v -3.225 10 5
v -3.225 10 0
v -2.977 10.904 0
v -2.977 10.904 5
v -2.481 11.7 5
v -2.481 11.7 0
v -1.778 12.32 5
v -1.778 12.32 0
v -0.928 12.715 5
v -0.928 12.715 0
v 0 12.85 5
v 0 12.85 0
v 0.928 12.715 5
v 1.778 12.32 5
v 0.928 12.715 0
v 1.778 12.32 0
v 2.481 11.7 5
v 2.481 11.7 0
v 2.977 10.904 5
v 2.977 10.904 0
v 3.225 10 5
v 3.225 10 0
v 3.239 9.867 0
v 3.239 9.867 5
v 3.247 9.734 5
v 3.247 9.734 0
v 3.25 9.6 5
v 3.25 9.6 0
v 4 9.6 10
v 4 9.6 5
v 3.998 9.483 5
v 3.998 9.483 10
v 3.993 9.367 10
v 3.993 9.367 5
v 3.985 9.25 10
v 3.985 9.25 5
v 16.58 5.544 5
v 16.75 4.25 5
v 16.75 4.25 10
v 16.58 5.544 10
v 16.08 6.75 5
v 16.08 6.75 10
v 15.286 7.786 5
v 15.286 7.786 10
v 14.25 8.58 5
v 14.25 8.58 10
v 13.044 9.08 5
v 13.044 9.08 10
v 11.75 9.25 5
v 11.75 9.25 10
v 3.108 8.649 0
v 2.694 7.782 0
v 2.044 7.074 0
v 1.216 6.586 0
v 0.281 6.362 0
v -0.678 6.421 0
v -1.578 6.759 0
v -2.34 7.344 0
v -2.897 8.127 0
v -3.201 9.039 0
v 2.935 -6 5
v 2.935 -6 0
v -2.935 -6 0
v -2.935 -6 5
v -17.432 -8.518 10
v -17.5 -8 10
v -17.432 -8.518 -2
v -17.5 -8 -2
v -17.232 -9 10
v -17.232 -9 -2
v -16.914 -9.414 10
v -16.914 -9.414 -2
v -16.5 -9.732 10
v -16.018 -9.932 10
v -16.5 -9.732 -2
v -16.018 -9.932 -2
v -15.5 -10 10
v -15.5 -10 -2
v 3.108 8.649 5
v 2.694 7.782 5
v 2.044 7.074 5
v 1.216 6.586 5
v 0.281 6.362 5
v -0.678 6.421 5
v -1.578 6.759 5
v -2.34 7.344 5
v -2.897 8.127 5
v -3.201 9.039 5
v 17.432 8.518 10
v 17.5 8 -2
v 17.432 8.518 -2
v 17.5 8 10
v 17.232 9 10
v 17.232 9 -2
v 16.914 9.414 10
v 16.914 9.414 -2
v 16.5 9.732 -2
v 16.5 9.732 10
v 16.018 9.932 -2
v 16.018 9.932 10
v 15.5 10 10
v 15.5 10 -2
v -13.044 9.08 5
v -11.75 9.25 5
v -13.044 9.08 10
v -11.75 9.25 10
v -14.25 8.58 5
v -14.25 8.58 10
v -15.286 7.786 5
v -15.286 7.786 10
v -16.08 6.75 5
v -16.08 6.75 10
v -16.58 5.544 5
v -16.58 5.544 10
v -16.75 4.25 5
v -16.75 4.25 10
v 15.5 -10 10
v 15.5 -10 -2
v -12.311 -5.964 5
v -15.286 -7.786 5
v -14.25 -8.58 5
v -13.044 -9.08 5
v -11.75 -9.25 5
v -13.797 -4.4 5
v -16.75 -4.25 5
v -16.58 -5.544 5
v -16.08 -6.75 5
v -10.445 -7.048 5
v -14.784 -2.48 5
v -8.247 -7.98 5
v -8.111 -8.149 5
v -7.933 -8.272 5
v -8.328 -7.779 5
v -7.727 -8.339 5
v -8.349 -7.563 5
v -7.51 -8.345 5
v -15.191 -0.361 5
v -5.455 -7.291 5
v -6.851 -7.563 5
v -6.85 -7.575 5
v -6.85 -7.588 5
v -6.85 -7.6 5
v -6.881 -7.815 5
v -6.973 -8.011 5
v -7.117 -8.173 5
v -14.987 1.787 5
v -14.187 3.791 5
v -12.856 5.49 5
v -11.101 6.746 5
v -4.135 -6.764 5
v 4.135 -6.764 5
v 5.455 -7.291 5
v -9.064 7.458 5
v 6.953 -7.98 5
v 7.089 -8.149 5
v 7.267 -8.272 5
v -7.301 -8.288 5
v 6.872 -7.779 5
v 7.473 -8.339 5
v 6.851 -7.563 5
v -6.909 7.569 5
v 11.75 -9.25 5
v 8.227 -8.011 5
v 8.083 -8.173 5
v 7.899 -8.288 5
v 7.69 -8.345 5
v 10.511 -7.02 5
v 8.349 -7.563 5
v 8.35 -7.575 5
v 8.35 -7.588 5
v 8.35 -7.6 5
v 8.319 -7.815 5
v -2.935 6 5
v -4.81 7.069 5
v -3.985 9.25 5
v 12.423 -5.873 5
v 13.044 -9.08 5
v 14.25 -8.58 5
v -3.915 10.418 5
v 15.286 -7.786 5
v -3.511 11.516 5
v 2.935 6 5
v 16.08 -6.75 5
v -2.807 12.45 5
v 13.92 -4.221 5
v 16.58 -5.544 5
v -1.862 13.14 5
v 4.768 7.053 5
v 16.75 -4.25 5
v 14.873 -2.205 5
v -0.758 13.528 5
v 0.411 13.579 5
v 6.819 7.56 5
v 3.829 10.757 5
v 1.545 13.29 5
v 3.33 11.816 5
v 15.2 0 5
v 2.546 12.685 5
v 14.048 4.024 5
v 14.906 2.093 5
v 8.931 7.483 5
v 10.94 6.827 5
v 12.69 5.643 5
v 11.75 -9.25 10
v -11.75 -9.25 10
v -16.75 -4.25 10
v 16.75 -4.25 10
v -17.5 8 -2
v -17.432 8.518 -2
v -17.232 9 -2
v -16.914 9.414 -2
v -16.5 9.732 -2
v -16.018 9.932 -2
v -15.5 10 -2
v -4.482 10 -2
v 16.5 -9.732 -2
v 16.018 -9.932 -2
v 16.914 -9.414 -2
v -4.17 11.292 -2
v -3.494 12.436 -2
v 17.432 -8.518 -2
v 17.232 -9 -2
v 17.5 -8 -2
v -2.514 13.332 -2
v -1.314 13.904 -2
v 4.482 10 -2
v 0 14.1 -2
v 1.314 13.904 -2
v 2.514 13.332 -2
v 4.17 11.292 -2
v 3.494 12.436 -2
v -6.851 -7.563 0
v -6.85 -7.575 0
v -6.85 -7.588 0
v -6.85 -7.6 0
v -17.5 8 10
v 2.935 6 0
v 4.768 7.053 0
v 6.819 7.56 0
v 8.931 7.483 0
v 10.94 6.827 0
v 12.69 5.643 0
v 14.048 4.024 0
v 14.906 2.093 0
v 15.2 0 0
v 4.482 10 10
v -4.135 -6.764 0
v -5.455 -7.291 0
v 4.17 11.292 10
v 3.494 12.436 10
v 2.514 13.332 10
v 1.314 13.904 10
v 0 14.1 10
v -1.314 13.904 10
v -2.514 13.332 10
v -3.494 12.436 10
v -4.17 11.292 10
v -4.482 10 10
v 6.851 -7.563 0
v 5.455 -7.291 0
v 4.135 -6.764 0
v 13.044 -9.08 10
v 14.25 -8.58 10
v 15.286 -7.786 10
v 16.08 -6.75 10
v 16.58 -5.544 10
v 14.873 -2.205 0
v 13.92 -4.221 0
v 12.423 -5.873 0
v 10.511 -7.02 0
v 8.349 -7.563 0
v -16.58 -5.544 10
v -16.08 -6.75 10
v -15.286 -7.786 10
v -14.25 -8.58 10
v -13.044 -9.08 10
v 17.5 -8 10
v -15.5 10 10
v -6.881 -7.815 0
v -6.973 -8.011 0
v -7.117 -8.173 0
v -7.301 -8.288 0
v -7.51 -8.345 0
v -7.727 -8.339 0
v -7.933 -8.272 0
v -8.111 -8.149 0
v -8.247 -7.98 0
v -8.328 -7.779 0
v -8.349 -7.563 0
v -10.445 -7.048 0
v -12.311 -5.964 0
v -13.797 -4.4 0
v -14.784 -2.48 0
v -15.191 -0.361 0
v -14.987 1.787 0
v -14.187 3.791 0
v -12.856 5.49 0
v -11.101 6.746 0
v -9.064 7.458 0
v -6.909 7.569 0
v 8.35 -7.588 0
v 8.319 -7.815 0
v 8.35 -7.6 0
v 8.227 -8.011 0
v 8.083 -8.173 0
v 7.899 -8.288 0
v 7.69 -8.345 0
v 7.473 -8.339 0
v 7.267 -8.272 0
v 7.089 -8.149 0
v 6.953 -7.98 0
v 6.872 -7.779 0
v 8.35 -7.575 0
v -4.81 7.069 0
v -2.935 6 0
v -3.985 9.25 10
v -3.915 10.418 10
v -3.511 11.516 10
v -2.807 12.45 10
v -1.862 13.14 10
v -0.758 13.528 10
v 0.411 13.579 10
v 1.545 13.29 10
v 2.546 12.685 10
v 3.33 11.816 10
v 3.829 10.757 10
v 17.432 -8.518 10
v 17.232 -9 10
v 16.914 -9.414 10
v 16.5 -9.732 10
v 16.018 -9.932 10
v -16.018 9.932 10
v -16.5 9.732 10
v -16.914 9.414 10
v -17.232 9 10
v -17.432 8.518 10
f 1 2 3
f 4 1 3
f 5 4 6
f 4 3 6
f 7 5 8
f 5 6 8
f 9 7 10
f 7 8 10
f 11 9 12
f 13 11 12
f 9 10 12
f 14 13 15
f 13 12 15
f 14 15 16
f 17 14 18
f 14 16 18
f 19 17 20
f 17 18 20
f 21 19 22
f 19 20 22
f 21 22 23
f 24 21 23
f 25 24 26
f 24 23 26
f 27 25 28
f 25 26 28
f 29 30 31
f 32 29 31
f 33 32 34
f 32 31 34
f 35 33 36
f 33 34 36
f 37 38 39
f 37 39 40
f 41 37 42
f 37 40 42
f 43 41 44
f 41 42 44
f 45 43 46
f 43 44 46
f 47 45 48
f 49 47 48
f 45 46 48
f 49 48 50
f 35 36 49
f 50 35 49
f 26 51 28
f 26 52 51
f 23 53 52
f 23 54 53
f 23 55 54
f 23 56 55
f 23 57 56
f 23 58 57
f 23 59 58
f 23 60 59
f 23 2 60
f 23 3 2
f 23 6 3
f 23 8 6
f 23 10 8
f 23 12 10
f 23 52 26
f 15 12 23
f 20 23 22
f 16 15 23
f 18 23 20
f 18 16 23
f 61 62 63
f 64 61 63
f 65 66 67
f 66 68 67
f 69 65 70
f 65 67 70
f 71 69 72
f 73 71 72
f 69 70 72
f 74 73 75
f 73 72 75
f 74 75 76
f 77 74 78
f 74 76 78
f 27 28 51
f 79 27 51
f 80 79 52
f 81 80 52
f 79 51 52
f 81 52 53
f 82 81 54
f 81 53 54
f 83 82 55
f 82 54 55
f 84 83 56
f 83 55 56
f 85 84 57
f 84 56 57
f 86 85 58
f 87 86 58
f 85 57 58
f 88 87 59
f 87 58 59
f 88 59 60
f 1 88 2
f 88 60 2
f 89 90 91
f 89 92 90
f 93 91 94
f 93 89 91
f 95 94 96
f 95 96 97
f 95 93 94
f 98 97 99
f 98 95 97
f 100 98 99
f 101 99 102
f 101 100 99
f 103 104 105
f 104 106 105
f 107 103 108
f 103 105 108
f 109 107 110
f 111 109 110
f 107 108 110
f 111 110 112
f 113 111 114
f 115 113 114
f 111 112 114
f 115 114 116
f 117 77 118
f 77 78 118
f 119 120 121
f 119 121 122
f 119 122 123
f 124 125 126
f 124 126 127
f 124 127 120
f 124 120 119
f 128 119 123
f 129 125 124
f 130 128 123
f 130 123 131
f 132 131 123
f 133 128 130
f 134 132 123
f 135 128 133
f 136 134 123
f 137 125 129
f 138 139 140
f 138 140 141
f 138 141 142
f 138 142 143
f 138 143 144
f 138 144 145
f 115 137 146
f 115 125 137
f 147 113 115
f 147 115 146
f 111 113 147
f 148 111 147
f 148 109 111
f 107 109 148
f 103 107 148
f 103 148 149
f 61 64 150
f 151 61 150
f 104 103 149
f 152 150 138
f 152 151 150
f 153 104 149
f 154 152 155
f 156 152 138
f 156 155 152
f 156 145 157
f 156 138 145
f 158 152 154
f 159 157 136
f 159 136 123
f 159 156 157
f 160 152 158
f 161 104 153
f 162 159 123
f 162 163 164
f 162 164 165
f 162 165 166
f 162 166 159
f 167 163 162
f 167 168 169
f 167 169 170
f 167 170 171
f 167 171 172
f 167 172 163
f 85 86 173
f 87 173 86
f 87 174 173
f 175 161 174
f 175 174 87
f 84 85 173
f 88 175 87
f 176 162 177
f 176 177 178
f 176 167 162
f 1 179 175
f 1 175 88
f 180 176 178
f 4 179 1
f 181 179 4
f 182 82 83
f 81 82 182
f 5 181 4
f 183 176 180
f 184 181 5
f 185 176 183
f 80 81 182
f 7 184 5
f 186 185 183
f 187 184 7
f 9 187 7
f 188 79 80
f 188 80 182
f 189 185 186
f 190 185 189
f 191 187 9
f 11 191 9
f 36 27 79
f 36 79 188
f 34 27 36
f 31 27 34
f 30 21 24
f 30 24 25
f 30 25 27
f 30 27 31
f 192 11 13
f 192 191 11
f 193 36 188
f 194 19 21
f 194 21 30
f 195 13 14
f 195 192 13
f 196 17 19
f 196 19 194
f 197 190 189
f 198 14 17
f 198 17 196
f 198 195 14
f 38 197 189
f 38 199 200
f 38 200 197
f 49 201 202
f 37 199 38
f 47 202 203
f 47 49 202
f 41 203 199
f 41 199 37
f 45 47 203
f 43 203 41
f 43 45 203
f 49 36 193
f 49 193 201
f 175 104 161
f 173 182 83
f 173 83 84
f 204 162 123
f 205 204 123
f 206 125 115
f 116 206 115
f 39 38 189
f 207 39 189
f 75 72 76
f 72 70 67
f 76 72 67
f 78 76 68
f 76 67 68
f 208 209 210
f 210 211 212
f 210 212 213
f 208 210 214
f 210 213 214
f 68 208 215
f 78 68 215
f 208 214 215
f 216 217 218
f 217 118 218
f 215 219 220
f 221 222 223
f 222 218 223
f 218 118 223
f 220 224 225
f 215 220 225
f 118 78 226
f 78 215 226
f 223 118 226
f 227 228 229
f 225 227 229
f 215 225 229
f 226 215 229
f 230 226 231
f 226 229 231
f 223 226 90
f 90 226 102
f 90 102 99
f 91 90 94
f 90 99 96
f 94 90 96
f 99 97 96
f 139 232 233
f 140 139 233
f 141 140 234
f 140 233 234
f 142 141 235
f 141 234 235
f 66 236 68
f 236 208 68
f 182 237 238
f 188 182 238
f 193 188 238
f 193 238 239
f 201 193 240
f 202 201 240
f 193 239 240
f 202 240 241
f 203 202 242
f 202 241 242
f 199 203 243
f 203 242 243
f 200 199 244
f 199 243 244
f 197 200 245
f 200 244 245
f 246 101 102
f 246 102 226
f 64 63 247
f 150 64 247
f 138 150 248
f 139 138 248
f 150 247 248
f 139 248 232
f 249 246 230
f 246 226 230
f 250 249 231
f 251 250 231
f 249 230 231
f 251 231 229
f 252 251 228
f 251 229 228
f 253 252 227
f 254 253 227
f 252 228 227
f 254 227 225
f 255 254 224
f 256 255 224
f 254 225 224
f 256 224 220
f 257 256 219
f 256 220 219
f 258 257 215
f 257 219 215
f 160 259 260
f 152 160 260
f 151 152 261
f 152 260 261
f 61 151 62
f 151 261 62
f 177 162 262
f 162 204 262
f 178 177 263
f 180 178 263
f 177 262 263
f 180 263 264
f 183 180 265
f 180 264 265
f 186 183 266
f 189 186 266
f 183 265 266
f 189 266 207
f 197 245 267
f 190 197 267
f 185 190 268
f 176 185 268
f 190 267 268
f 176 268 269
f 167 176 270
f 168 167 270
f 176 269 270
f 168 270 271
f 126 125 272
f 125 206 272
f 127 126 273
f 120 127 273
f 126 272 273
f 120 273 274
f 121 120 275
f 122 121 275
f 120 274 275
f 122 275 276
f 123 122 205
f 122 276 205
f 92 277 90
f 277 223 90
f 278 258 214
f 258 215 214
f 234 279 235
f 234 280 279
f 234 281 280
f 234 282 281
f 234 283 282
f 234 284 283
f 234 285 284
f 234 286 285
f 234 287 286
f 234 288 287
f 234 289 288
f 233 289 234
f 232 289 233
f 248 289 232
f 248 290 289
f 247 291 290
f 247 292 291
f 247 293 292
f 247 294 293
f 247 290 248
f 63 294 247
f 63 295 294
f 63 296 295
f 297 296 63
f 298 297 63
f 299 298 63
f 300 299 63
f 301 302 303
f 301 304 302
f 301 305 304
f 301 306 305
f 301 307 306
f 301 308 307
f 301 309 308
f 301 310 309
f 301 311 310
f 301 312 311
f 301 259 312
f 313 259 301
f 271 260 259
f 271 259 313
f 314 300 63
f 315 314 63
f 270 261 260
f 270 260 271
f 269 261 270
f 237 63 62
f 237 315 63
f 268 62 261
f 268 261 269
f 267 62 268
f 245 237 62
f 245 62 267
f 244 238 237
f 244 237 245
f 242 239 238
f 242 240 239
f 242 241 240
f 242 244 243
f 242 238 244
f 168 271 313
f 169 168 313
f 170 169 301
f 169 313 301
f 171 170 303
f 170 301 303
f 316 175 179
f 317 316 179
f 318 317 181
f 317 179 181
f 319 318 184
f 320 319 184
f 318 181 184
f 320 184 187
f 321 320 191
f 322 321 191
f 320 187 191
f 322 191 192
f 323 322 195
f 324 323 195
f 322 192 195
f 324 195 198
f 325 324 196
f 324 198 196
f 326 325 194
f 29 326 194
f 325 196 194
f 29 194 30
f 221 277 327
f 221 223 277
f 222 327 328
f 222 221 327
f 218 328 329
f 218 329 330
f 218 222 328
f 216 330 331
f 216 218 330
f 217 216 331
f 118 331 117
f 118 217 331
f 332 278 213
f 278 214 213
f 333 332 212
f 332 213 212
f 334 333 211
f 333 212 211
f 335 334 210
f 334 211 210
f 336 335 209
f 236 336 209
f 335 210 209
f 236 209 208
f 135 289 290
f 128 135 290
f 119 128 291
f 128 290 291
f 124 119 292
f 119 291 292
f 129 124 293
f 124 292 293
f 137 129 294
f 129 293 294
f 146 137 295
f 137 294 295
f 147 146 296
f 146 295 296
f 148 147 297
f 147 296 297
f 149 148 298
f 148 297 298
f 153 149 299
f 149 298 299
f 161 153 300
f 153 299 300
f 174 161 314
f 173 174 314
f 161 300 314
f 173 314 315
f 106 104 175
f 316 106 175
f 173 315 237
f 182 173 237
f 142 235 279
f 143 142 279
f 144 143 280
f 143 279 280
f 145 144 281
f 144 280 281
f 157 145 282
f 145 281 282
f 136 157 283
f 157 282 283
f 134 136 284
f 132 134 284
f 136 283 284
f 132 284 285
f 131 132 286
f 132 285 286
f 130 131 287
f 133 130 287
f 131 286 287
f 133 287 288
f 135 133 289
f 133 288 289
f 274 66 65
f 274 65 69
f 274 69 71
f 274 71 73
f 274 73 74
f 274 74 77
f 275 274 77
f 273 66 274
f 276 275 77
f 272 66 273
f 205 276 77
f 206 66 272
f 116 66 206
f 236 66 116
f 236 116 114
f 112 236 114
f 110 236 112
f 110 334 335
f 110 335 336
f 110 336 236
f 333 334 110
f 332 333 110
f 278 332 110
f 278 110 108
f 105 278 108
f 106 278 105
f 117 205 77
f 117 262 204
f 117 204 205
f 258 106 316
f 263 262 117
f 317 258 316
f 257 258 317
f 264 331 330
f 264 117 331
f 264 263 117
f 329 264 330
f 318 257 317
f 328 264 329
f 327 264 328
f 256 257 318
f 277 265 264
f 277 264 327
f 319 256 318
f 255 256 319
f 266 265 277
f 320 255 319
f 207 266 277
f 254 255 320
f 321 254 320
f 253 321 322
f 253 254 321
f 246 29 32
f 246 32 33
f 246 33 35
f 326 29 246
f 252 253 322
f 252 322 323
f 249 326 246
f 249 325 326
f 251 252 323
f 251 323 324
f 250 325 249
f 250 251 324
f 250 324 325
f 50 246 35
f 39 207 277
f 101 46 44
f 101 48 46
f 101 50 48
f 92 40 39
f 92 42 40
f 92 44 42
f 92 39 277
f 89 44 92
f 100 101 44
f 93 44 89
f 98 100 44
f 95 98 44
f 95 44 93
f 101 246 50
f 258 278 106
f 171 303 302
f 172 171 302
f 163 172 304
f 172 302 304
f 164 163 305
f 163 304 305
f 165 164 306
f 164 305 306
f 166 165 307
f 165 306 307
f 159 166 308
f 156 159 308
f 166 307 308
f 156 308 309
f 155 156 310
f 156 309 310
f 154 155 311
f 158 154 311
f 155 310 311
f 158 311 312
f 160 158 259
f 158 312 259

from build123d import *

# Parameters (mm, degrees)
F1_DEPTH = 2
F2_DEPTH = 5
F4_DEPTH = 5
F5_R     = 2
F6_R     = 5


# Not quite as in the source:
# - a feature names something its author has since deleted; it is built from what else it names


with BuildPart() as f1:
    # F0 (on Top) → F1 (new body)
    with BuildSketch(Plane.XY):
        with BuildLine():
            ThreePointArc((4.4821870069, 10), (0, 14.100000456), (-4.4821870069, 10))
            Line((-4.4821870069, 10), (-3.2252907411, 10))
            ThreePointArc((-3.2252907411, 10), (0, 12.850000456), (3.2252907411, 10))
            Line((3.2252907411, 10), (4.4821870069, 10))
        make_face()
        with BuildLine():
            Line((3.2252907411, 10), (-3.2252907411, 10))
            ThreePointArc((-3.2252907411, 10), (-0.2003810013, 6.3561836525), (3.25, 9.600000456))
            ThreePointArc((3.25, 9.600000456), (3.2438168034, 9.8003814573), (3.2252907411, 10))
        make_face()
        with BuildLine():
            ThreePointArc((3.2252907411, 10), (0, 12.850000456), (-3.2252907411, 10))
            Line((-3.2252907411, 10), (3.2252907411, 10))
        make_face()
        with BuildLine():
            ThreePointArc((-2.9352384841, 6), (-0.7731344117, 3.3397464334), (0, 0))
            ThreePointArc((0, 0), (0.7731344117, 3.3397464334), (2.9352384841, 6))
            Line((2.9352384841, 6), (2.699999392, 6))
            ThreePointArc((2.699999392, 6), (0, 5.100000456), (-2.699999392, 6))
            Line((-2.699999392, 6), (-2.9352384841, 6))
        make_face()
        with BuildLine():
            ThreePointArc((2.9352384841, -6), (0.7731344117, -3.3397464334), (0, 0))
            ThreePointArc((0, 0), (-0.7731344117, -3.3397464334), (-2.9352384841, -6))
            Line((-2.9352384841, -6), (2.9352384841, -6))
        make_face()
        with BuildLine():
            ThreePointArc((-4.4821870069, 10), (-4.1104683878, 7.768593993), (-2.699999392, 6))
            Line((-2.699999392, 6), (2.699999392, 6))
            ThreePointArc((2.699999392, 6), (4.0249221896, 7.5875389364), (4.5, 9.600000456))
            ThreePointArc((4.5, 9.600000456), (4.495544546, 9.8001984442), (4.4821870069, 10))
            Line((4.4821870069, 10), (3.2252907411, 10))
            ThreePointArc((3.2252907411, 10), (3.2438168034, 9.8003814573), (3.25, 9.600000456))
            ThreePointArc((3.25, 9.600000456), (-0.2003810013, 6.3561836525), (-3.2252907411, 10))
            Line((-3.2252907411, 10), (-4.4821870069, 10))
        make_face()
        with BuildLine():
            ThreePointArc((-2.9352384841, -6), (-0.7731344117, -3.3397464334), (0, 0))
            ThreePointArc((0, 0), (-0.7731344117, 3.3397464334), (-2.9352384841, 6))
            ThreePointArc((-2.9352384841, 6), (-14.6584577236, 2.8174766307), (-8.3490864524, -7.5629934211))
            ThreePointArc((-8.3490864524, -7.5629934211), (-7.6, -6.85), (-6.8509135476, -7.5629934211))
            ThreePointArc((-6.8509135476, -7.5629934211), (-4.7825233693, -7.0584577236), (-2.9352384841, -6))
        make_face()
        with BuildLine():
            ThreePointArc((2.9352384841, 6), (0.7731344117, 3.3397464334), (0, 0))
            ThreePointArc((0, 0), (0.7731344117, -3.3397464334), (2.9352384841, -6))
            ThreePointArc((2.9352384841, -6), (4.7825233693, -7.0584577236), (6.8509135476, -7.5629934211))
            ThreePointArc((6.8509135476, -7.5629934211), (7.6, -6.85), (8.3490864524, -7.5629934211))
            ThreePointArc((8.3490864524, -7.5629934211), (13.2326306926, -5.1023006067), (15.2, 0))
            ThreePointArc((15.2, 0), (10.9397464334, 6.8268655883), (2.9352384841, 6))
        make_face()
        with BuildLine():
            ThreePointArc((-8.3490864524, -7.5629934211), (-14.6584577236, 2.8174766307), (-2.9352384841, 6))
            Line((-2.9352384841, 6), (-2.699999392, 6))
            ThreePointArc((-2.699999392, 6), (-4.1104683878, 7.768593993), (-4.4821870069, 10))
            Line((-4.4821870069, 10), (-17.5, 10))
            Line((-17.5, 10), (-17.5, -10))
            Line((-17.5, -10), (17.5, -10))
            Line((17.5, -10), (17.5, 10))
            Line((17.5, 10), (4.4821870069, 10))
            ThreePointArc((4.4821870069, 10), (4.495544546, 9.8001984442), (4.5, 9.600000456))
            ThreePointArc((4.5, 9.600000456), (4.0249221896, 7.5875389364), (2.699999392, 6))
            Line((2.699999392, 6), (2.9352384841, 6))
            ThreePointArc((2.9352384841, 6), (10.9397464334, 6.8268655883), (15.2, 0))
            ThreePointArc((15.2, 0), (13.2326306926, -5.1023006067), (8.3490864524, -7.5629934211))
            ThreePointArc((8.3490864524, -7.5629934211), (8.3497715783, -7.5814910734), (8.35, -7.6))
            ThreePointArc((8.35, -7.6), (7.5814910734, -8.3497715783), (6.8509135476, -7.5629934211))
            ThreePointArc((6.8509135476, -7.5629934211), (4.7825233693, -7.0584577236), (2.9352384841, -6))
            Line((2.9352384841, -6), (-2.9352384841, -6))
            ThreePointArc((-2.9352384841, -6), (-4.7825233693, -7.0584577236), (-6.8509135476, -7.5629934211))
            ThreePointArc((-6.8509135476, -7.5629934211), (-6.8502284217, -7.5814910734), (-6.85, -7.6))
            ThreePointArc((-6.85, -7.6), (-7.6185089266, -8.3497715783), (-8.3490864524, -7.5629934211))
        make_face()
        with BuildLine():
            ThreePointArc((-6.8509135476, -7.5629934211), (-7.6, -6.85), (-8.3490864524, -7.5629934211))
            ThreePointArc((-8.3490864524, -7.5629934211), (-7.6, -7.6), (-6.8509135476, -7.5629934211))
        make_face()
        with BuildLine():
            ThreePointArc((-6.8509135476, -7.5629934211), (-7.6, -7.6), (-8.3490864524, -7.5629934211))
            ThreePointArc((-8.3490864524, -7.5629934211), (-7.6185089266, -8.3497715783), (-6.85, -7.6))
            ThreePointArc((-6.85, -7.6), (-6.8502284217, -7.5814910734), (-6.8509135476, -7.5629934211))
        make_face()
        with BuildLine():
            ThreePointArc((8.3490864524, -7.5629934211), (7.6, -6.85), (6.8509135476, -7.5629934211))
            ThreePointArc((6.8509135476, -7.5629934211), (7.6, -7.6), (8.3490864524, -7.5629934211))
        make_face()
        with BuildLine():
            ThreePointArc((8.3490864524, -7.5629934211), (7.6, -7.6), (6.8509135476, -7.5629934211))
            ThreePointArc((6.8509135476, -7.5629934211), (7.5814910734, -8.3497715783), (8.35, -7.6))
            ThreePointArc((8.35, -7.6), (8.3497715783, -7.5814910734), (8.3490864524, -7.5629934211))
        make_face()
        with BuildLine():
            Line((2.699999392, 6), (-2.699999392, 6))
            ThreePointArc((-2.699999392, 6), (0, 5.100000456), (2.699999392, 6))
        make_face()
    extrude(amount=-F1_DEPTH)

    # F0 (on Top) → F2 (join)
    with BuildSketch(Plane.XY):
        with BuildLine():
            ThreePointArc((-8.3490864524, -7.5629934211), (-14.6584577236, 2.8174766307), (-2.9352384841, 6))
            Line((-2.9352384841, 6), (-2.699999392, 6))
            ThreePointArc((-2.699999392, 6), (-4.1104683878, 7.768593993), (-4.4821870069, 10))
            Line((-4.4821870069, 10), (-17.5, 10))
            Line((-17.5, 10), (-17.5, -10))
            Line((-17.5, -10), (17.5, -10))
            Line((17.5, -10), (17.5, 10))
            Line((17.5, 10), (4.4821870069, 10))
            ThreePointArc((4.4821870069, 10), (4.495544546, 9.8001984442), (4.5, 9.600000456))
            ThreePointArc((4.5, 9.600000456), (4.0249221896, 7.5875389364), (2.699999392, 6))
            Line((2.699999392, 6), (2.9352384841, 6))
            ThreePointArc((2.9352384841, 6), (10.9397464334, 6.8268655883), (15.2, 0))
            ThreePointArc((15.2, 0), (13.2326306926, -5.1023006067), (8.3490864524, -7.5629934211))
            ThreePointArc((8.3490864524, -7.5629934211), (8.3497715783, -7.5814910734), (8.35, -7.6))
            ThreePointArc((8.35, -7.6), (7.5814910734, -8.3497715783), (6.8509135476, -7.5629934211))
            ThreePointArc((6.8509135476, -7.5629934211), (4.7825233693, -7.0584577236), (2.9352384841, -6))
            Line((2.9352384841, -6), (-2.9352384841, -6))
            ThreePointArc((-2.9352384841, -6), (-4.7825233693, -7.0584577236), (-6.8509135476, -7.5629934211))
            ThreePointArc((-6.8509135476, -7.5629934211), (-6.8502284217, -7.5814910734), (-6.85, -7.6))
            ThreePointArc((-6.85, -7.6), (-7.6185089266, -8.3497715783), (-8.3490864524, -7.5629934211))
        make_face()
        with BuildLine():
            ThreePointArc((4.4821870069, 10), (0, 14.100000456), (-4.4821870069, 10))
            Line((-4.4821870069, 10), (-3.2252907411, 10))
            ThreePointArc((-3.2252907411, 10), (0, 12.850000456), (3.2252907411, 10))
            Line((3.2252907411, 10), (4.4821870069, 10))
        make_face()
        with BuildLine():
            ThreePointArc((-4.4821870069, 10), (-4.1104683878, 7.768593993), (-2.699999392, 6))
            Line((-2.699999392, 6), (2.699999392, 6))
            ThreePointArc((2.699999392, 6), (4.0249221896, 7.5875389364), (4.5, 9.600000456))
            ThreePointArc((4.5, 9.600000456), (4.495544546, 9.8001984442), (4.4821870069, 10))
            Line((4.4821870069, 10), (3.2252907411, 10))
            ThreePointArc((3.2252907411, 10), (3.2438168034, 9.8003814573), (3.25, 9.600000456))
            ThreePointArc((3.25, 9.600000456), (-0.2003810013, 6.3561836525), (-3.2252907411, 10))
            Line((-3.2252907411, 10), (-4.4821870069, 10))
        make_face()
    extrude(amount=F2_DEPTH)

    # F3 (on face) → F4 (join)
    with BuildSketch(Plane.XY.offset(5)):
        with BuildLine():
            Line((17.5, -10), (17.5, 10))
            Line((17.5, 10), (4.4821870069, 10))
            ThreePointArc((4.4821870069, 10), (0, 14.100000456), (-4.4821870069, 10))
            Line((-4.4821870069, 10), (-17.5, 10))
            Line((-17.5, 10), (-17.5, -10))
            Line((-17.5, -10), (17.5, -10))
        make_face()
        with BuildLine():
            Line((3.9846580381, 9.25), (16.75, 9.25))
            Line((16.75, 9.25), (16.75, -9.25))
            Line((16.75, -9.25), (-16.75, -9.25))
            Line((-16.75, -9.25), (-16.75, 9.25))
            Line((-16.75, 9.25), (-3.9846580381, 9.25))
            ThreePointArc((-3.9846580381, 9.25), (-0.1751682727, 13.5961631249), (4, 9.600000456))
            ThreePointArc((4, 9.600000456), (3.9961626689, 9.4248321833), (3.9846580381, 9.25))
        make_face(mode=Mode.SUBTRACT)
    extrude(amount=F4_DEPTH)

    # F5
    f5_edges = [f1.edges().sort_by_distance(p)[0] for p in [
        (-17.5, 10, 4),
        (17.5, 10, 4),
        (17.5, -10, 4),
        (-17.5, -10, 4),
    ]]
    fillet(f5_edges, radius=F5_R)

    # F6
    f6_edges = [f1.edges().sort_by_distance(p)[0] for p in [
        (16.75, -9.25, 7.5),
        (-16.75, -9.25, 7.5),
        (16.75, 9.25, 7.5),
        (-16.75, 9.25, 7.5),
    ]]
    fillet(f6_edges, radius=F6_R)


solid = f1.part
